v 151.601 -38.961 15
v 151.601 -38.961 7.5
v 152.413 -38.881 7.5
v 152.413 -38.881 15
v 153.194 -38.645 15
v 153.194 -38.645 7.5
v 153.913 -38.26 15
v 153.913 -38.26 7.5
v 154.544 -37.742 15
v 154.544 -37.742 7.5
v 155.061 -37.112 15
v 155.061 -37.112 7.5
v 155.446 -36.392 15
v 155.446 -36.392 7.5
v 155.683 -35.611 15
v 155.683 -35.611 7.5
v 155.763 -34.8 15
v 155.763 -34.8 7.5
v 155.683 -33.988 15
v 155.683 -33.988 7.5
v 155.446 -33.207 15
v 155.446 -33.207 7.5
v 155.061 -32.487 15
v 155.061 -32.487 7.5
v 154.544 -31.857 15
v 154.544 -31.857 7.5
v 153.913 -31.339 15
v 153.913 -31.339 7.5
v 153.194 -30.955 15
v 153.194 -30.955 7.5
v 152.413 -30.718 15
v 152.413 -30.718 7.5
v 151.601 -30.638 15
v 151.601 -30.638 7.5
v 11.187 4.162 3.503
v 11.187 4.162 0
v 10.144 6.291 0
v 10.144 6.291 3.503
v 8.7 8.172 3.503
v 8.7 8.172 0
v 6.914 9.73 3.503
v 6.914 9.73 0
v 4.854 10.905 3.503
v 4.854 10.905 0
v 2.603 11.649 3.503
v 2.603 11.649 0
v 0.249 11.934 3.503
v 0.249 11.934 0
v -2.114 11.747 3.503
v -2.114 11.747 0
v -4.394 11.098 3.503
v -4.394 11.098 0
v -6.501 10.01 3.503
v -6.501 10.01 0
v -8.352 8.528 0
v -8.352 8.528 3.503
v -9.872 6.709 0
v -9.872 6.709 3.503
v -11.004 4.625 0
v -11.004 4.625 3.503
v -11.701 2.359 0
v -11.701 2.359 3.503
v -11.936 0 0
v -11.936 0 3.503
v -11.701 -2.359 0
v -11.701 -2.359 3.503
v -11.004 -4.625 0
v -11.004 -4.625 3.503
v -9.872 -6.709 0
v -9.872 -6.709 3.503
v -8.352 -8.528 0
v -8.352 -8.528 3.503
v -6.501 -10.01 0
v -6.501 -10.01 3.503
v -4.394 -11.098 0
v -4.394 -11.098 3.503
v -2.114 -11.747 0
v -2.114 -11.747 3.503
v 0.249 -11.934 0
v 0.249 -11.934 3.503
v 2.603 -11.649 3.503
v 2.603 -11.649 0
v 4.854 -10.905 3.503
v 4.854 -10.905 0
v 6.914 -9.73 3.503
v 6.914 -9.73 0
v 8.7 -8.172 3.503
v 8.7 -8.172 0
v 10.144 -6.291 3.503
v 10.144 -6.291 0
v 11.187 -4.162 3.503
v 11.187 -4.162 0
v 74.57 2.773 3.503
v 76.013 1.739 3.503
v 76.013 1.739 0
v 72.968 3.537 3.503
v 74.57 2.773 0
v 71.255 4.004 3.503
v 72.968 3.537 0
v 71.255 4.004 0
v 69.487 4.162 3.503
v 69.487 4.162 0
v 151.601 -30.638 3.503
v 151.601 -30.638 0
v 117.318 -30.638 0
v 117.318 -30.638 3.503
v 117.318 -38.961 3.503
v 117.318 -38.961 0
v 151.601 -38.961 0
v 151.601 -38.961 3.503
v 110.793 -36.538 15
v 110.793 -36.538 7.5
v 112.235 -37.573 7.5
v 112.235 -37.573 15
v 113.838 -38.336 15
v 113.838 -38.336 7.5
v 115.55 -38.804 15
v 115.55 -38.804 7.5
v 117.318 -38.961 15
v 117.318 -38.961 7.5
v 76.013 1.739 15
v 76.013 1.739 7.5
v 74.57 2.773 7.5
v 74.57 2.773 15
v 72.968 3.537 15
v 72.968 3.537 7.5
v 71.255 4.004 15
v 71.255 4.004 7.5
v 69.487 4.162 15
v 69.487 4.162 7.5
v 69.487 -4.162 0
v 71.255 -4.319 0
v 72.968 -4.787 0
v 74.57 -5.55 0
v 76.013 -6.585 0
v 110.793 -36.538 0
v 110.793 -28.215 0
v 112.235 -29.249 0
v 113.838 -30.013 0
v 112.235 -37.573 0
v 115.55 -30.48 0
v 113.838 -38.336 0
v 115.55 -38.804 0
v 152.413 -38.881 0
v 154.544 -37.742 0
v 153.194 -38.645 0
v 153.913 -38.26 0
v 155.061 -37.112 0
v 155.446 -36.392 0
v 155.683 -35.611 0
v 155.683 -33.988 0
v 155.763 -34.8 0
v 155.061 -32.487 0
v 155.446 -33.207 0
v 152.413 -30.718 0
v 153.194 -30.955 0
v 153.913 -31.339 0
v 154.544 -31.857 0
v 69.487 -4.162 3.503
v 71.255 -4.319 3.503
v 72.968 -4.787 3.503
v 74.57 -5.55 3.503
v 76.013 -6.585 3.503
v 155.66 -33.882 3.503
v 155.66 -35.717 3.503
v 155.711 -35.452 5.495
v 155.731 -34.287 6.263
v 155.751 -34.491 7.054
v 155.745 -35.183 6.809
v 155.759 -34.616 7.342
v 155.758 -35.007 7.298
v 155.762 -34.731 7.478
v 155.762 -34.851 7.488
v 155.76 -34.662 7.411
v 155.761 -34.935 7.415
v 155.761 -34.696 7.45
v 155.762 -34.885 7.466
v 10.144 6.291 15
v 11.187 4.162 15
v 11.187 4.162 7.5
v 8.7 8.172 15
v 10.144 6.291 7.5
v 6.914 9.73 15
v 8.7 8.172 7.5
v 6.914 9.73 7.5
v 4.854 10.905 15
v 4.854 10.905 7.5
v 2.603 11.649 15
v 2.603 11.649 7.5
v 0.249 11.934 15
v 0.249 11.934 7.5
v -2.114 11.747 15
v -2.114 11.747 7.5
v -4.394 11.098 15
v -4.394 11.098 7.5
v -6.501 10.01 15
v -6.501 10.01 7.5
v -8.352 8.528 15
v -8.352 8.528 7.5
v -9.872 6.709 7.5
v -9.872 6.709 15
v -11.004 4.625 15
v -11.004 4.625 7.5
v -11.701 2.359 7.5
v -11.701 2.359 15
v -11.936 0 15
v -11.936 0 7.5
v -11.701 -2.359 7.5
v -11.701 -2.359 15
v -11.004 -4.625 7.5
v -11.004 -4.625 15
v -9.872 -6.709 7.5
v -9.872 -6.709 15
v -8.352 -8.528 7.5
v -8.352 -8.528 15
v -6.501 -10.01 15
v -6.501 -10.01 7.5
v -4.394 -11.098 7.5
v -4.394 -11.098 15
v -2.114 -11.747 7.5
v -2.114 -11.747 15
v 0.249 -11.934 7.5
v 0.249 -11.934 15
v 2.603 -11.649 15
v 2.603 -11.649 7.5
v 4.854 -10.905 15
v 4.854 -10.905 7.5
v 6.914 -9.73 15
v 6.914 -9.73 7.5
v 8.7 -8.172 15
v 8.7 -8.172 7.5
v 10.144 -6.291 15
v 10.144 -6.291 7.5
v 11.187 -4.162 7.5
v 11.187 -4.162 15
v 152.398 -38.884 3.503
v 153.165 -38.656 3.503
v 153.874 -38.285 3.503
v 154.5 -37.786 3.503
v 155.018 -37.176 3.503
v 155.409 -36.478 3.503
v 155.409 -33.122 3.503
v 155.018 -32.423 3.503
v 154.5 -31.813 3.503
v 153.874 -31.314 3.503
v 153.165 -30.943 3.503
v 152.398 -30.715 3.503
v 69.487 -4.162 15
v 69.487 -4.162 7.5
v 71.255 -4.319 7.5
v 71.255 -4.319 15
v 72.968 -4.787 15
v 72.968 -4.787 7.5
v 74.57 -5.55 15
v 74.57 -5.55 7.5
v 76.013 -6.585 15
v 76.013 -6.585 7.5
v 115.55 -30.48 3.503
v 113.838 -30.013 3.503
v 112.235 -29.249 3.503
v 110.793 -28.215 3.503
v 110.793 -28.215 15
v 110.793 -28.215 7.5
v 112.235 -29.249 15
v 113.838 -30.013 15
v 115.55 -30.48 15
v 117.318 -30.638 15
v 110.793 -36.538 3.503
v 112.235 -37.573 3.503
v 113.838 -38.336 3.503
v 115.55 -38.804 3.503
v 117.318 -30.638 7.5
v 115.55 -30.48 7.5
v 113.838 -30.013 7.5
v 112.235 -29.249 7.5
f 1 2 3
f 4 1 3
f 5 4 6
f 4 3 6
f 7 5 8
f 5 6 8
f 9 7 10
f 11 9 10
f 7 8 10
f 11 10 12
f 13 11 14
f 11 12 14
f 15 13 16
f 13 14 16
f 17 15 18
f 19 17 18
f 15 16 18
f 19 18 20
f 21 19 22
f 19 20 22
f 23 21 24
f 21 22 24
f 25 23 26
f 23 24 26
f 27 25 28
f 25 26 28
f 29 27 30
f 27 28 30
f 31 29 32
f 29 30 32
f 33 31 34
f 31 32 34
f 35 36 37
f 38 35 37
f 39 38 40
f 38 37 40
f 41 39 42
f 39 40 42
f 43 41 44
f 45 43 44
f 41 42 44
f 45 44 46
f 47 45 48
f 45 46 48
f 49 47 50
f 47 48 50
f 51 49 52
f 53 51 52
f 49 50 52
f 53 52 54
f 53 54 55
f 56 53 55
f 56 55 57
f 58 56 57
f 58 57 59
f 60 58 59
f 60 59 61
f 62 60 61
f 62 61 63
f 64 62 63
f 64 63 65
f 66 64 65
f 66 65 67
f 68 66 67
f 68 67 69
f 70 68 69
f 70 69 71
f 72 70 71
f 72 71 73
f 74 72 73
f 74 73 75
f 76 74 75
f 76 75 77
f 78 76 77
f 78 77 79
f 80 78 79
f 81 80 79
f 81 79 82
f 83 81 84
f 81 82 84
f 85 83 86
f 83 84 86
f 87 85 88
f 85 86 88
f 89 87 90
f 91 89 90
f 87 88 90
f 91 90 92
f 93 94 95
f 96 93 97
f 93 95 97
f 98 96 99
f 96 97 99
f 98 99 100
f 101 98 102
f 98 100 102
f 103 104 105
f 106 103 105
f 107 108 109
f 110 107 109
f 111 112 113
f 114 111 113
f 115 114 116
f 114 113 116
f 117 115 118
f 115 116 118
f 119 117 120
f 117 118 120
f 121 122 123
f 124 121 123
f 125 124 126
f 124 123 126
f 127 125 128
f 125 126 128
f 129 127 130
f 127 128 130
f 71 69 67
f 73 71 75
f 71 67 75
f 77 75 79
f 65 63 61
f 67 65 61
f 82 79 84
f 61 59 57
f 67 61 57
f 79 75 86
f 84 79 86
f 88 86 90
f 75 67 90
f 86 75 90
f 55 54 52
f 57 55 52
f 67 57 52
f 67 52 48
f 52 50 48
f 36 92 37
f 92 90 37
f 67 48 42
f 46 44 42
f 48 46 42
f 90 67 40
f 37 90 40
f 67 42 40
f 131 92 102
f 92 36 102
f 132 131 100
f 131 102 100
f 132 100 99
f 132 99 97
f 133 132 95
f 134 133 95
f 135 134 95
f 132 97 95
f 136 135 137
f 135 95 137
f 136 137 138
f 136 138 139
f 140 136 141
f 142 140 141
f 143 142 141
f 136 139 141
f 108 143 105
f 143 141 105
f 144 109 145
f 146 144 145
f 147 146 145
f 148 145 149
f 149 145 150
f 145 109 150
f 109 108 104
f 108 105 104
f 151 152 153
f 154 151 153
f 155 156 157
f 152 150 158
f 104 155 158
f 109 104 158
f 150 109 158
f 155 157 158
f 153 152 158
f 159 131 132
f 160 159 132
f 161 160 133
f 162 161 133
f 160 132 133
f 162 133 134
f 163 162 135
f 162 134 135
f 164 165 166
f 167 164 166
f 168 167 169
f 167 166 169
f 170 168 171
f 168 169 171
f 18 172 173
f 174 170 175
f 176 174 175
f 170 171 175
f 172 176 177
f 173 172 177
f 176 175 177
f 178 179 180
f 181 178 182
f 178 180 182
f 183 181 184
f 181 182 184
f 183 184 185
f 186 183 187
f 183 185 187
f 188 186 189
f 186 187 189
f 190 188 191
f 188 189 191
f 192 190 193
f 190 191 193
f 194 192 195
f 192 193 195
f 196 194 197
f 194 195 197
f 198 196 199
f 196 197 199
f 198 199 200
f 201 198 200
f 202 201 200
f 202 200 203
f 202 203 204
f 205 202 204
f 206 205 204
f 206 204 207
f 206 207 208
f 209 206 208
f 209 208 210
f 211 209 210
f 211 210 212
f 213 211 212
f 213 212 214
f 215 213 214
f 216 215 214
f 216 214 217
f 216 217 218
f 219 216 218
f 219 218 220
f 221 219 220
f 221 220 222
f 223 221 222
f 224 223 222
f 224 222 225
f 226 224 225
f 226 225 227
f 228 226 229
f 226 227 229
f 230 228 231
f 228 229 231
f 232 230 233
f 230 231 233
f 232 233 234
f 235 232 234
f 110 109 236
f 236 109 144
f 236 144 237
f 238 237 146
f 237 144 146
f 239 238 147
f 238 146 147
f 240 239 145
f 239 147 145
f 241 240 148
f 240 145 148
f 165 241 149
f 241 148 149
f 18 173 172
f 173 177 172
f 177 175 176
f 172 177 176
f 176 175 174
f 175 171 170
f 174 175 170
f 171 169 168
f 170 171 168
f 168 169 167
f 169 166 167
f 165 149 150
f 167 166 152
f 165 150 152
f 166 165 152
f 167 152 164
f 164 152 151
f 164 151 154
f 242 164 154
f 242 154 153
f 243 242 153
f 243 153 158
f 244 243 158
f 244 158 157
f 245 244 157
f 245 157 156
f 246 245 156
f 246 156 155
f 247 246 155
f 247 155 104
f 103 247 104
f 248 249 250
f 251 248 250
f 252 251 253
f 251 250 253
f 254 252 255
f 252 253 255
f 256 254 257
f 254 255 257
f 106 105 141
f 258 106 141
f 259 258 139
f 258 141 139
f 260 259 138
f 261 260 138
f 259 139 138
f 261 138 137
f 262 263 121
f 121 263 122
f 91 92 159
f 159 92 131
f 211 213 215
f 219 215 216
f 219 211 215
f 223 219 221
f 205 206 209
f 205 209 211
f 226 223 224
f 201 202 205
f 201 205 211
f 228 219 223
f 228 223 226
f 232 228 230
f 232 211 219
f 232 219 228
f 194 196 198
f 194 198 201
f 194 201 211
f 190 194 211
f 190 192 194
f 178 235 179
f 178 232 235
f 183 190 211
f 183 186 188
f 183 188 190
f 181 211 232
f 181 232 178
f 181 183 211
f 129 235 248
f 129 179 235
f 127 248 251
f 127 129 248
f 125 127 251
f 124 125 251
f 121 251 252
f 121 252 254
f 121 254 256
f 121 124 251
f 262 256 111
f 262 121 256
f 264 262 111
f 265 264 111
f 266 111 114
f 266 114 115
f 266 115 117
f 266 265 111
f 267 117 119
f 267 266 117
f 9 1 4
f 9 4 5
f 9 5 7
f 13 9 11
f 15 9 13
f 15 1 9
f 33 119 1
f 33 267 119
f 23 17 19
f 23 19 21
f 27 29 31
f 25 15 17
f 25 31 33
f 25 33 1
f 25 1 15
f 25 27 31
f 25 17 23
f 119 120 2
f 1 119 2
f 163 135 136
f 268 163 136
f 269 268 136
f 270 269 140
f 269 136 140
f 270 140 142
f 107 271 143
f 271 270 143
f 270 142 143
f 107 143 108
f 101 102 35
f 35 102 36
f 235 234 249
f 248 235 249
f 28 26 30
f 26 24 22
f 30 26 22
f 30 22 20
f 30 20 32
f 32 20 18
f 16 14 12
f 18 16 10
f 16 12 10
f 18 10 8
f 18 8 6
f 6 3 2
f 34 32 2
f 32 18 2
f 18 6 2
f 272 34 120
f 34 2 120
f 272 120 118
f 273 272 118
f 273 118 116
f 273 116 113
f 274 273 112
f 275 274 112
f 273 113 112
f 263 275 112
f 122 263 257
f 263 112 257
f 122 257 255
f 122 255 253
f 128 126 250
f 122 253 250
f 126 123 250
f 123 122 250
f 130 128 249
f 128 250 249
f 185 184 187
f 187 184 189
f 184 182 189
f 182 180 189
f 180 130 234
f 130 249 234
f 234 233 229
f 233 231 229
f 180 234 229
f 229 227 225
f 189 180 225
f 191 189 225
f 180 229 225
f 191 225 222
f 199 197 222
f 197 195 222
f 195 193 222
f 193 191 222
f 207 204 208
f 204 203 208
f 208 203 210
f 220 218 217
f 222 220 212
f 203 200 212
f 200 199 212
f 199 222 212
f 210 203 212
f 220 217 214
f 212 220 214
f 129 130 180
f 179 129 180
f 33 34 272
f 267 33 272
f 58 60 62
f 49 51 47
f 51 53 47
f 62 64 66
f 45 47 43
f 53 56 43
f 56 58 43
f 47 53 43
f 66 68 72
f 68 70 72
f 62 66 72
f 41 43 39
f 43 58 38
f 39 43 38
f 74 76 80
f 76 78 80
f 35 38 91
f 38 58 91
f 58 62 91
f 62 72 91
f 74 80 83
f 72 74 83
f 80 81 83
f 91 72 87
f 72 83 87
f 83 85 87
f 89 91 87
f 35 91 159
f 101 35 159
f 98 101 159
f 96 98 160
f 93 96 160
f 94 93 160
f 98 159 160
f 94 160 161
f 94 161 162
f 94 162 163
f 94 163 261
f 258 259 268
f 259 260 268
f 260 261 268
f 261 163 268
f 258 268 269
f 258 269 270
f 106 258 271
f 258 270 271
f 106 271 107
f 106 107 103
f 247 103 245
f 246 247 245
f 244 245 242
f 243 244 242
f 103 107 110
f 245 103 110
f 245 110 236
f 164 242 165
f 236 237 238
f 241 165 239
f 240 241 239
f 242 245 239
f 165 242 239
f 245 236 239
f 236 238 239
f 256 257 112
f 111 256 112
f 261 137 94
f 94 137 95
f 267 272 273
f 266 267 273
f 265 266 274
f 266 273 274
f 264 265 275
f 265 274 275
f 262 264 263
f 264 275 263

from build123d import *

# Parameters (mm, degrees)
EXTRUDE_1_DEPTH          = 15
CUT_EXTRUDE_1_DEPTH      = 163.316412297
CUT_EXTRUDE_1_DEPTH_BACK = 163.316412297


with BuildPart() as part:
    # 草图1 → 凸台-拉伸1 (new body)
    with BuildSketch(Plane.XY):
        with BuildLine():
            Line((11.187173962, -4.16175765), (69.487021894, -4.16175765))
            ThreePointArc((69.487021894, -4.16175765), (72.967546248, -4.787006975), (76.012831502, -6.584567606))
            Line((76.012831502, -6.584567606), (110.792662814, -36.53848931))
            ThreePointArc((110.792662814, -36.53848931), (113.837948067, -38.336049941), (117.318472421, -38.961299266))
            Line((117.318472421, -38.961299266), (151.600945406, -38.961299266))
            ThreePointArc((151.600945406, -38.961299266), (155.762703056, -34.799541616), (151.600945406, -30.637783966))
            Line((151.600945406, -30.637783966), (117.318472421, -30.637783966))
            ThreePointArc((117.318472421, -30.637783966), (113.837948067, -30.012534641), (110.792662814, -28.21497401))
            Line((110.792662814, -28.21497401), (76.012831502, 1.738947694))
            ThreePointArc((76.012831502, 1.738947694), (72.967546248, 3.536508325), (69.487021894, 4.16175765))
            Line((69.487021894, 4.16175765), (11.187173962, 4.16175765))
            ThreePointArc((11.187173962, 4.16175765), (-11.936209113, 0), (11.187173962, -4.16175765))
        make_face()
    extrude(amount=EXTRUDE_1_DEPTH)

    # 草图4 → 切除-拉伸1 (cut, two sides: drawn at the far end of the back side and taken through both)
    with BuildSketch(Plane(origin=(0, 4.16175765, 0), x_dir=(1, 0, 0), z_dir=(0, 1, 0)).offset(-CUT_EXTRUDE_1_DEPTH_BACK)):
        Polygon((-11.936209113, -3.503414807), (155.660228834, -3.503414807), (155.762703056, -7.5), (-11.936209113, -7.5), align=None)
    extrude(amount=CUT_EXTRUDE_1_DEPTH + CUT_EXTRUDE_1_DEPTH_BACK, mode=Mode.SUBTRACT)


with BuildPart() as cut_extrude_1_piece_1:
    # of the separate pieces the step leaves, piece 1, a body of its own (cut_extrude_1_pieces)
    add(part.part.solids().sort_by_distance((117.318472421, -30.637783966, 7.5))[0])


with BuildPart() as cut_extrude_1_piece_2:
    # of the separate pieces the step leaves, piece 2, a body of its own (cut_extrude_1_pieces)
    add(part.part.solids().sort_by_distance((117.318472421, -30.637783966, 0))[0])


solid = Compound([cut_extrude_1_piece_1.part, cut_extrude_1_piece_2.part])
